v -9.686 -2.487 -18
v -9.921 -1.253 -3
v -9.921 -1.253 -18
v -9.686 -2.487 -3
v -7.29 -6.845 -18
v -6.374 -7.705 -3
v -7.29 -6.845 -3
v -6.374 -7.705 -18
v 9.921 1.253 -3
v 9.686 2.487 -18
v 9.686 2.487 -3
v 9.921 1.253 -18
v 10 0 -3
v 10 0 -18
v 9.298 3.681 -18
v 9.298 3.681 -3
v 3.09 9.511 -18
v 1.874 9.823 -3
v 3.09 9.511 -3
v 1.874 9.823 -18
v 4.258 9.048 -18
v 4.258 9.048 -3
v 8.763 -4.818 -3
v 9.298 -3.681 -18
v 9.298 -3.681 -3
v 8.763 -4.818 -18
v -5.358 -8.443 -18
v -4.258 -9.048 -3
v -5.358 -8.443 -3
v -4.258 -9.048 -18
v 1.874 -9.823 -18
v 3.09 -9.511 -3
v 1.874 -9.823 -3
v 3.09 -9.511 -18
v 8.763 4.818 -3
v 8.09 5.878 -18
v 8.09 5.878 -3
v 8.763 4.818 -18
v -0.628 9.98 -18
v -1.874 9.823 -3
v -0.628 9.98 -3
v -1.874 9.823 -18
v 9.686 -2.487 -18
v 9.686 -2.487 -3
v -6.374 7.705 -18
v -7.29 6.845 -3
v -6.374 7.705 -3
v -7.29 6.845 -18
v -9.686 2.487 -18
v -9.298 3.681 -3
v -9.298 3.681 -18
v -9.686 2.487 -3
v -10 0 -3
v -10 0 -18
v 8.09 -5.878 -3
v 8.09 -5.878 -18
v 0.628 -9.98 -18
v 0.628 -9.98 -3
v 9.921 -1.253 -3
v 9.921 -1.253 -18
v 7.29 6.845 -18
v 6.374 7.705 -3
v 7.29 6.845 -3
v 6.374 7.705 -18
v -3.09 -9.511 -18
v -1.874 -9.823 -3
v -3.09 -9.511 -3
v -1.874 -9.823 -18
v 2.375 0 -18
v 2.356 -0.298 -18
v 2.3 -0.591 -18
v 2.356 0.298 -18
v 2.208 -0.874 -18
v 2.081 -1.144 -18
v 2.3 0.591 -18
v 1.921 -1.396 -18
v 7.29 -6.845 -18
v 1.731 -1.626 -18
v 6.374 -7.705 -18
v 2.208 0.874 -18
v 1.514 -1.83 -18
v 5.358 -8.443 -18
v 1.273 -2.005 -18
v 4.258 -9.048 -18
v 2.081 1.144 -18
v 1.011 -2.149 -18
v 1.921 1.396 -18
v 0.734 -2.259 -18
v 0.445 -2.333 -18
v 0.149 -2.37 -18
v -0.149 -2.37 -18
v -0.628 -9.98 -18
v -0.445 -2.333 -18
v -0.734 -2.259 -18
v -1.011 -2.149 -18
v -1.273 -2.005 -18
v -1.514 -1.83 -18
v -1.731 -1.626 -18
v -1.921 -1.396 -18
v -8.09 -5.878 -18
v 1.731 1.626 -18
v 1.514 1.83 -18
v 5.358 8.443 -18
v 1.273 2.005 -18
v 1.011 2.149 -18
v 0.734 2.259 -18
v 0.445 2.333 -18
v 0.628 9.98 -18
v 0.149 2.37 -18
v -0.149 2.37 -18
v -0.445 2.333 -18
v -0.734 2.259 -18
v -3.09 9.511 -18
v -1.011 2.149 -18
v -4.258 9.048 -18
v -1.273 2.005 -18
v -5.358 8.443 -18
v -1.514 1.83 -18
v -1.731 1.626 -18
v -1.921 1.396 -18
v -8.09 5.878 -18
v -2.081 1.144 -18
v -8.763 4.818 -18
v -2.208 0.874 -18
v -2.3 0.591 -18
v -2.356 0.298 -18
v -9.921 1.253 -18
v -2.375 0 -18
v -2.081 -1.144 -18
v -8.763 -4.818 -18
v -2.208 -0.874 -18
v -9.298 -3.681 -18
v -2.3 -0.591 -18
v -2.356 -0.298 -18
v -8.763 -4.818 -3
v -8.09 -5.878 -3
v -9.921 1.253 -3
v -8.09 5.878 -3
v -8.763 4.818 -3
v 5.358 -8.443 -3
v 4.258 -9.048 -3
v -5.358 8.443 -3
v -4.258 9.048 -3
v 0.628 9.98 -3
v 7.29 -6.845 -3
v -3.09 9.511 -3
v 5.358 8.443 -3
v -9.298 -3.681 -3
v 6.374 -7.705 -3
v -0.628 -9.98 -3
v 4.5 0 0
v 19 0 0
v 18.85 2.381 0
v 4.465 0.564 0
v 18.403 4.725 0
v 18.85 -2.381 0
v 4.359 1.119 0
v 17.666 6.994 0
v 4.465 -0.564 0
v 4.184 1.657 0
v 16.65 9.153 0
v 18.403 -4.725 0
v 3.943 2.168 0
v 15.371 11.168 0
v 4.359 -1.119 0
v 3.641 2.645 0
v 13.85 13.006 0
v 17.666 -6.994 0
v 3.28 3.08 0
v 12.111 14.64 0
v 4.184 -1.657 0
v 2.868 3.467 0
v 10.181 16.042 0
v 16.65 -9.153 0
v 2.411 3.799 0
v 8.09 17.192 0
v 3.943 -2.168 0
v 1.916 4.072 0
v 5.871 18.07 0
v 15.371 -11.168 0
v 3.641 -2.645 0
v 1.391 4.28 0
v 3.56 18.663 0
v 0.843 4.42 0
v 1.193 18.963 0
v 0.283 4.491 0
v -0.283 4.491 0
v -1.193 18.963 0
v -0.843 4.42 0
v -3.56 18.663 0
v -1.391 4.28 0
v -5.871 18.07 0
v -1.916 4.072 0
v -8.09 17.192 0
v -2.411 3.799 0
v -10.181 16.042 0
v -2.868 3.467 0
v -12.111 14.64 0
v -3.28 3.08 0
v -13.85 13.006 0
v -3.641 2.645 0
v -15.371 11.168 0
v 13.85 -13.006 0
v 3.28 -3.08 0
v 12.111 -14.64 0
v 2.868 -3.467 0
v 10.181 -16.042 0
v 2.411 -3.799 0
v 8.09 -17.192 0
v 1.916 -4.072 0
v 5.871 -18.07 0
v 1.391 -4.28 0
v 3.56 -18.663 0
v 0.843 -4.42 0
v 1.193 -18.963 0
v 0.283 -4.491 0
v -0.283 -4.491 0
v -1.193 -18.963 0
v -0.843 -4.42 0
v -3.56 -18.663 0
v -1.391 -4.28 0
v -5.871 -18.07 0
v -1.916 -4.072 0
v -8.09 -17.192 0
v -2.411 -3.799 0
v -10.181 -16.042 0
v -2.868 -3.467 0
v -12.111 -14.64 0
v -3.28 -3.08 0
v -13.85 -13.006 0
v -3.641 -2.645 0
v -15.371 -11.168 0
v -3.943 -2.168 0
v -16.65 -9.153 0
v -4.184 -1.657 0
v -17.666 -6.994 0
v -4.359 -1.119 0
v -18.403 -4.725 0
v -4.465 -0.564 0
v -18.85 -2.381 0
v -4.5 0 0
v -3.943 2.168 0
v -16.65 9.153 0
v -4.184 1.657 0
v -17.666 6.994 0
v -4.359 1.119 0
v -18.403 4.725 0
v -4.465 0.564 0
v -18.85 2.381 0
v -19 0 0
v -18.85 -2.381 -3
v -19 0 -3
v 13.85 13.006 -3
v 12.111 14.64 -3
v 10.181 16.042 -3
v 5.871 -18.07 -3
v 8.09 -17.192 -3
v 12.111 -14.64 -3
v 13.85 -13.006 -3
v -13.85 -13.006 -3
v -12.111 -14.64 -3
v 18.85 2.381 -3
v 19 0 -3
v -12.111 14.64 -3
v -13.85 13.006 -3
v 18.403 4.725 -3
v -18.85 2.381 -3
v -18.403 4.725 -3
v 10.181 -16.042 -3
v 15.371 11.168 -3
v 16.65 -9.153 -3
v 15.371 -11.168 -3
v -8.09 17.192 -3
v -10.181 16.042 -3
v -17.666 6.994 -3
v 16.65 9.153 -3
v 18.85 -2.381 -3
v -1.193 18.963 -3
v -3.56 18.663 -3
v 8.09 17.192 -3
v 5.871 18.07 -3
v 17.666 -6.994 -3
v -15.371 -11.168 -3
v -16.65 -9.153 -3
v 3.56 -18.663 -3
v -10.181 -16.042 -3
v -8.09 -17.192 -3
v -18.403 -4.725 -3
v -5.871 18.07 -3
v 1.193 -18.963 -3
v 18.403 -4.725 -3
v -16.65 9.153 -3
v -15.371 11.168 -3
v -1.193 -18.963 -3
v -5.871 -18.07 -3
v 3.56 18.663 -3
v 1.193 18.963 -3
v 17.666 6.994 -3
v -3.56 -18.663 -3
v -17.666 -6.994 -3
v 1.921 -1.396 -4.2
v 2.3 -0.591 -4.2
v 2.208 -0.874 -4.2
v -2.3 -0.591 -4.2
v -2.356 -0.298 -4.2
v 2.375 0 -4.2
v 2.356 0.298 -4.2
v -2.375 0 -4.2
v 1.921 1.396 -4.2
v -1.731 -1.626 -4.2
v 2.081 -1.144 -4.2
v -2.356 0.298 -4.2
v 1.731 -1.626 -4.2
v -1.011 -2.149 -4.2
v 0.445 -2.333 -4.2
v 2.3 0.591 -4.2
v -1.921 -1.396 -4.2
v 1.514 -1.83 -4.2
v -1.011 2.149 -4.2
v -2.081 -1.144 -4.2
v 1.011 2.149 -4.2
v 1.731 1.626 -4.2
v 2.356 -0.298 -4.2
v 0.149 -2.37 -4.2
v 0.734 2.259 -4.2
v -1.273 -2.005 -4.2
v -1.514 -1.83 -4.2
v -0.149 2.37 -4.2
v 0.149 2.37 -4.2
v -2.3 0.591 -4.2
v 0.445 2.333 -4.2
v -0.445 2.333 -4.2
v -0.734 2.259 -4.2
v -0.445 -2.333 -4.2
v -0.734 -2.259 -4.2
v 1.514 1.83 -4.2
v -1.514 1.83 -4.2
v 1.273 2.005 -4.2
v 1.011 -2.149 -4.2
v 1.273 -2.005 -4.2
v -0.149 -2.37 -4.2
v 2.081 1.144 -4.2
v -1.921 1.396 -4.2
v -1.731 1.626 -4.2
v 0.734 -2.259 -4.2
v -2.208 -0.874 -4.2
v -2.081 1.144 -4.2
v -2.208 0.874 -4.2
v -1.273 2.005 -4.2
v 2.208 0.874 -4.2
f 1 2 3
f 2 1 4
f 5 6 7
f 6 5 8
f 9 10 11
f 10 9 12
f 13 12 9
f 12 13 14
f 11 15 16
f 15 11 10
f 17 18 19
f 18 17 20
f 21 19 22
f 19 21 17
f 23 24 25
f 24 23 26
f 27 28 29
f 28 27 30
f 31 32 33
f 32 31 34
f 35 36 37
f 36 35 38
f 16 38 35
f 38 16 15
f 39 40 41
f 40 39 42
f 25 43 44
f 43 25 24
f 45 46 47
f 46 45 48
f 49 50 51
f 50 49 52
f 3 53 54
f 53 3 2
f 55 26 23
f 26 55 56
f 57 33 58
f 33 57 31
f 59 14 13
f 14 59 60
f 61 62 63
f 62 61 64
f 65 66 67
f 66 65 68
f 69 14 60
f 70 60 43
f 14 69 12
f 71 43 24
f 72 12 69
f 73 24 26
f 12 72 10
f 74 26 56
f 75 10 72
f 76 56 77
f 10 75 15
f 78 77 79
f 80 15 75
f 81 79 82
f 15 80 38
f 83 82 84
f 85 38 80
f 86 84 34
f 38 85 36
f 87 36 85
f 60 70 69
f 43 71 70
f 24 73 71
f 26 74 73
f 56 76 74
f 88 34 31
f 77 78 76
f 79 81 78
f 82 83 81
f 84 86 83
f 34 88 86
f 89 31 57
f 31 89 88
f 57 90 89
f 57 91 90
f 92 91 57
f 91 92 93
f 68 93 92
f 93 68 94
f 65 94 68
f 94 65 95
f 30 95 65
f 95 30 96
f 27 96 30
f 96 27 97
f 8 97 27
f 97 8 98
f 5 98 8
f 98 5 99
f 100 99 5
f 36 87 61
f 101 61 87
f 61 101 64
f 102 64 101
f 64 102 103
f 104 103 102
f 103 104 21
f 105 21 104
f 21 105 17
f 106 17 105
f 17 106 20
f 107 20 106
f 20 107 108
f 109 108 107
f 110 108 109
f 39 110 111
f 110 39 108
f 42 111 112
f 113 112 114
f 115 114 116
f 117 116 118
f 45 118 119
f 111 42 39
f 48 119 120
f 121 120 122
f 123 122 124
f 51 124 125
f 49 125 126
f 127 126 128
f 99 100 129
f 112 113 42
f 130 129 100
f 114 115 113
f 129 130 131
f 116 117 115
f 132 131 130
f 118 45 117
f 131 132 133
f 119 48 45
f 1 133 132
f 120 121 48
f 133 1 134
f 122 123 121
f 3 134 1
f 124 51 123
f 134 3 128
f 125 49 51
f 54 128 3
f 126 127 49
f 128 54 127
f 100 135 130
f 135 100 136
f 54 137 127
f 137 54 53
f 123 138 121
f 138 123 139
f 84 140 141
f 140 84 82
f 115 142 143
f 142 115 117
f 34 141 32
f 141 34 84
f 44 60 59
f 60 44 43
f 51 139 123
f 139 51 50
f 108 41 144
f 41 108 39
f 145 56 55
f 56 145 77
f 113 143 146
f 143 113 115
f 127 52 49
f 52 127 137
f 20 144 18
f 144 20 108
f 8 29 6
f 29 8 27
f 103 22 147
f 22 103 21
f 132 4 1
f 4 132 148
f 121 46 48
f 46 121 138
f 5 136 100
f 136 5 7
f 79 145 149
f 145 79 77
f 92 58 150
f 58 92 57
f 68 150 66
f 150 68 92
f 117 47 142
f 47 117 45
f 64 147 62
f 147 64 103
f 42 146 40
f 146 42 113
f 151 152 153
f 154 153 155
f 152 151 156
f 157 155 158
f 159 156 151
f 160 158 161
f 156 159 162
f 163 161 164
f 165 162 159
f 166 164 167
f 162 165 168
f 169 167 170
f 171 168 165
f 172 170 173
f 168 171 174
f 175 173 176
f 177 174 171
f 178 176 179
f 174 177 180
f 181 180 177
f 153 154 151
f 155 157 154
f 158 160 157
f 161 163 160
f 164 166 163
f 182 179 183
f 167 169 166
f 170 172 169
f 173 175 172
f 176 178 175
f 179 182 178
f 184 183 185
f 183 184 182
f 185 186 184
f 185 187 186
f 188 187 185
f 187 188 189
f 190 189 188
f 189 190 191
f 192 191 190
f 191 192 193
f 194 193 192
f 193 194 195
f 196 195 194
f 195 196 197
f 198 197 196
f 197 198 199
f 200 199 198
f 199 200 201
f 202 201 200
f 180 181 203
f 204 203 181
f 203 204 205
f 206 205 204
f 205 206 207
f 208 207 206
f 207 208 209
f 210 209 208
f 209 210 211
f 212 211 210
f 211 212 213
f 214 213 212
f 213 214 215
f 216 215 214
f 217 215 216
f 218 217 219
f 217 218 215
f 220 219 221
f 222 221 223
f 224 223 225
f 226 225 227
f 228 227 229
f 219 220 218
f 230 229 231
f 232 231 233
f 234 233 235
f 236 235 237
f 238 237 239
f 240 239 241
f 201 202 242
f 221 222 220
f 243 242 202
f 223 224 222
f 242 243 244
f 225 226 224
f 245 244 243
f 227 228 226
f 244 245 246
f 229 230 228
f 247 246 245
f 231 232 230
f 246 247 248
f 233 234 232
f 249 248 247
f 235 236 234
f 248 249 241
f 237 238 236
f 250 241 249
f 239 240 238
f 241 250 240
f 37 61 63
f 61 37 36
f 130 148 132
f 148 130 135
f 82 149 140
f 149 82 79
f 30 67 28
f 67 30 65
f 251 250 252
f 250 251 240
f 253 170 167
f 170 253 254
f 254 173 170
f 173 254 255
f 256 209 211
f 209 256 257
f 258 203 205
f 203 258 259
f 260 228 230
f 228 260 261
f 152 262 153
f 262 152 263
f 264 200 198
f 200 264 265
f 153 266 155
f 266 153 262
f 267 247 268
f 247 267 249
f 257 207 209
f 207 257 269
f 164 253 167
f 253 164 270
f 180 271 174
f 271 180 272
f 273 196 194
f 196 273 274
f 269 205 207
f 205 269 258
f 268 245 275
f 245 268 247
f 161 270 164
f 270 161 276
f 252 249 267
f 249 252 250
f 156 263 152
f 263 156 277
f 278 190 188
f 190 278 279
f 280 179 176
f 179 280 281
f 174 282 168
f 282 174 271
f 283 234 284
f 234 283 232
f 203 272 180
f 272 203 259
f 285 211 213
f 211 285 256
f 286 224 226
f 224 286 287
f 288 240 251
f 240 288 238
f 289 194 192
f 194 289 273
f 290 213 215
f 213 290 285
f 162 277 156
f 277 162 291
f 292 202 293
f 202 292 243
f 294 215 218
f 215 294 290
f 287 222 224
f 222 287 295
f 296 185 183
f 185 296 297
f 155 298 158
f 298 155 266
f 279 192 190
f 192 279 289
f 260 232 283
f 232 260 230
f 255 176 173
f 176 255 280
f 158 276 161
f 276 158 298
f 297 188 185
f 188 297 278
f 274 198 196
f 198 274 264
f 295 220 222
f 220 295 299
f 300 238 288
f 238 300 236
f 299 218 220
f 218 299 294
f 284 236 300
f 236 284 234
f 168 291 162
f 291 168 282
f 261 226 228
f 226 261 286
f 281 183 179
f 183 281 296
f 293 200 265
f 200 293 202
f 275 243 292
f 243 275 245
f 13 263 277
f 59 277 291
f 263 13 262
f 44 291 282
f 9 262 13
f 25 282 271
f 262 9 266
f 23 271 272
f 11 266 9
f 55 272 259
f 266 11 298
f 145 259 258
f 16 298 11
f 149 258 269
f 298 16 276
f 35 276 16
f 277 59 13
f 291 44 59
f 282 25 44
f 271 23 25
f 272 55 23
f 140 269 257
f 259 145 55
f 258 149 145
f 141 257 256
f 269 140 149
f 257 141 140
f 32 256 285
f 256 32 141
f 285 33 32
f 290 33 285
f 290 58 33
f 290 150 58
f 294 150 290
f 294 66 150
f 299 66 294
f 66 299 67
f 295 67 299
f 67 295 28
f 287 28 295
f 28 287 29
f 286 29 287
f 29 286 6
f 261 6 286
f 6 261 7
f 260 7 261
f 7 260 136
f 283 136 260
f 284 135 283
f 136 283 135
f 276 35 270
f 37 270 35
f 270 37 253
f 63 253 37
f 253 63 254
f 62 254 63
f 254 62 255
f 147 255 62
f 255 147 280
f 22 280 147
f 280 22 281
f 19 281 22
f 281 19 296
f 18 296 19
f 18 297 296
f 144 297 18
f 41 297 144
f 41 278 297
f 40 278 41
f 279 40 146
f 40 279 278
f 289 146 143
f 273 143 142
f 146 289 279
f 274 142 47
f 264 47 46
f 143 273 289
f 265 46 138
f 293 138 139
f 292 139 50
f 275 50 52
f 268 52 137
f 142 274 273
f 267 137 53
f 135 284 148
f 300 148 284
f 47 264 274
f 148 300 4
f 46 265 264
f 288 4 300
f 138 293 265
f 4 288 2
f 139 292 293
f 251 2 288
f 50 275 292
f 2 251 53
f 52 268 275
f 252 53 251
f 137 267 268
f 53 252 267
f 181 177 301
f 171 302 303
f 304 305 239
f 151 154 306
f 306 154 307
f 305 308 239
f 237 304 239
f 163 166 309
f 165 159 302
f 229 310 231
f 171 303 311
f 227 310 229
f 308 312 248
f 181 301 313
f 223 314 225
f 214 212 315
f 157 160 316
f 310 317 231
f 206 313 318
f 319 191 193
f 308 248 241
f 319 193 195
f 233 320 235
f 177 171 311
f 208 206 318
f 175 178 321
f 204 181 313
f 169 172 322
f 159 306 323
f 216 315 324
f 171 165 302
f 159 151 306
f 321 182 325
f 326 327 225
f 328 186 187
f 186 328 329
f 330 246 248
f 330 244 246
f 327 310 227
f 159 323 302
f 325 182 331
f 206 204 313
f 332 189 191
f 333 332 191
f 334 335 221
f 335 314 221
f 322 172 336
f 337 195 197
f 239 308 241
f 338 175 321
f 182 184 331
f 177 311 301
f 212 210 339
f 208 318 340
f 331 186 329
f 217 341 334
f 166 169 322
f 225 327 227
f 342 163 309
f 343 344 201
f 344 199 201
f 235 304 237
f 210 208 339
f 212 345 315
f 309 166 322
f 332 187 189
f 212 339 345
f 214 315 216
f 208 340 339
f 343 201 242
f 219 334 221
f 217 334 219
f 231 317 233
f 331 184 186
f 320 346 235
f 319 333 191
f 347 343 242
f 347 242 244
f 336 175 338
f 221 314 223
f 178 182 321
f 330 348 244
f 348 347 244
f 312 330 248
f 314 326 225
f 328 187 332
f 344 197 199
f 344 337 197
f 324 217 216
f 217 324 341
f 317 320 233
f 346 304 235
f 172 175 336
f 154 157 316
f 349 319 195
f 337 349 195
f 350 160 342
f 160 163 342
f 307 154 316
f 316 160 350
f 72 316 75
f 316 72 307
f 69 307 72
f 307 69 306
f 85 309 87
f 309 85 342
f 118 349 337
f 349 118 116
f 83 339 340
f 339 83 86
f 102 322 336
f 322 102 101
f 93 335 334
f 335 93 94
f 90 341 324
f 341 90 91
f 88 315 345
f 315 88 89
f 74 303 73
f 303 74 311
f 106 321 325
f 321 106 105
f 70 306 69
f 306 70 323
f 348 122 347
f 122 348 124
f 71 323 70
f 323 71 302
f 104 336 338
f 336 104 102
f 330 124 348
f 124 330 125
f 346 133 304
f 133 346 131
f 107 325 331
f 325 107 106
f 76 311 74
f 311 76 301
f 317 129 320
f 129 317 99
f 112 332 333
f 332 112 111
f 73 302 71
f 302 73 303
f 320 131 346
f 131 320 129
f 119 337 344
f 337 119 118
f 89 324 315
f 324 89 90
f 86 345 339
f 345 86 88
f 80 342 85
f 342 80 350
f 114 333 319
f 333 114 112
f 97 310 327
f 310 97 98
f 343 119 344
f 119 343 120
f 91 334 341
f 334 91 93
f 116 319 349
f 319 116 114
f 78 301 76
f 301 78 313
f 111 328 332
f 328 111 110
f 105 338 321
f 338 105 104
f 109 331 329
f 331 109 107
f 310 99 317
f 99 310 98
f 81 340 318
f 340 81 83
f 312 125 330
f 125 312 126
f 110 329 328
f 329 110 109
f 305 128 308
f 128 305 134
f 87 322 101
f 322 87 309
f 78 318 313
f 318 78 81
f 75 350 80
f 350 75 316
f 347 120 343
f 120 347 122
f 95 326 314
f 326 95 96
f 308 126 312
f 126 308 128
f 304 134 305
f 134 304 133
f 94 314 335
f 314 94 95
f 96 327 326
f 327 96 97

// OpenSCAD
$fn = 50;


difference() {
	union() {
		translate(v = [0, 0, -18.0000000000]) {
			cylinder(h = 18, r = 10.0000000000);
		}
		translate(v = [0, 0, -3.0000000000]) {
			cylinder(h = 3, r = 19.0000000000);
		}
	}
	union() {
		translate(v = [0, 0, 0]) {
			rotate(a = [0, 0, 0]) {
				difference() {
					union() {
						#translate(v = [0, 0, -18.0000000000]) {
							cylinder(h = 18, r = 2.2500000000);
						}
						#translate(v = [0, 0, -4.2000000000]) {
							cylinder(h = 4.2000000000, r = 10.0000000000, r1 = 2.3750000000, r2 = 4.5000000000);
						}
						#translate(v = [0, 0, -18.0000000000]) {
							cylinder(h = 18, r = 2.3750000000);
						}
						#translate(v = [0, 0, -18.0000000000]) {
							cylinder(h = 18, r = 2.2500000000);
						}
					}
					union();
				}
			}
		}
	}
}
